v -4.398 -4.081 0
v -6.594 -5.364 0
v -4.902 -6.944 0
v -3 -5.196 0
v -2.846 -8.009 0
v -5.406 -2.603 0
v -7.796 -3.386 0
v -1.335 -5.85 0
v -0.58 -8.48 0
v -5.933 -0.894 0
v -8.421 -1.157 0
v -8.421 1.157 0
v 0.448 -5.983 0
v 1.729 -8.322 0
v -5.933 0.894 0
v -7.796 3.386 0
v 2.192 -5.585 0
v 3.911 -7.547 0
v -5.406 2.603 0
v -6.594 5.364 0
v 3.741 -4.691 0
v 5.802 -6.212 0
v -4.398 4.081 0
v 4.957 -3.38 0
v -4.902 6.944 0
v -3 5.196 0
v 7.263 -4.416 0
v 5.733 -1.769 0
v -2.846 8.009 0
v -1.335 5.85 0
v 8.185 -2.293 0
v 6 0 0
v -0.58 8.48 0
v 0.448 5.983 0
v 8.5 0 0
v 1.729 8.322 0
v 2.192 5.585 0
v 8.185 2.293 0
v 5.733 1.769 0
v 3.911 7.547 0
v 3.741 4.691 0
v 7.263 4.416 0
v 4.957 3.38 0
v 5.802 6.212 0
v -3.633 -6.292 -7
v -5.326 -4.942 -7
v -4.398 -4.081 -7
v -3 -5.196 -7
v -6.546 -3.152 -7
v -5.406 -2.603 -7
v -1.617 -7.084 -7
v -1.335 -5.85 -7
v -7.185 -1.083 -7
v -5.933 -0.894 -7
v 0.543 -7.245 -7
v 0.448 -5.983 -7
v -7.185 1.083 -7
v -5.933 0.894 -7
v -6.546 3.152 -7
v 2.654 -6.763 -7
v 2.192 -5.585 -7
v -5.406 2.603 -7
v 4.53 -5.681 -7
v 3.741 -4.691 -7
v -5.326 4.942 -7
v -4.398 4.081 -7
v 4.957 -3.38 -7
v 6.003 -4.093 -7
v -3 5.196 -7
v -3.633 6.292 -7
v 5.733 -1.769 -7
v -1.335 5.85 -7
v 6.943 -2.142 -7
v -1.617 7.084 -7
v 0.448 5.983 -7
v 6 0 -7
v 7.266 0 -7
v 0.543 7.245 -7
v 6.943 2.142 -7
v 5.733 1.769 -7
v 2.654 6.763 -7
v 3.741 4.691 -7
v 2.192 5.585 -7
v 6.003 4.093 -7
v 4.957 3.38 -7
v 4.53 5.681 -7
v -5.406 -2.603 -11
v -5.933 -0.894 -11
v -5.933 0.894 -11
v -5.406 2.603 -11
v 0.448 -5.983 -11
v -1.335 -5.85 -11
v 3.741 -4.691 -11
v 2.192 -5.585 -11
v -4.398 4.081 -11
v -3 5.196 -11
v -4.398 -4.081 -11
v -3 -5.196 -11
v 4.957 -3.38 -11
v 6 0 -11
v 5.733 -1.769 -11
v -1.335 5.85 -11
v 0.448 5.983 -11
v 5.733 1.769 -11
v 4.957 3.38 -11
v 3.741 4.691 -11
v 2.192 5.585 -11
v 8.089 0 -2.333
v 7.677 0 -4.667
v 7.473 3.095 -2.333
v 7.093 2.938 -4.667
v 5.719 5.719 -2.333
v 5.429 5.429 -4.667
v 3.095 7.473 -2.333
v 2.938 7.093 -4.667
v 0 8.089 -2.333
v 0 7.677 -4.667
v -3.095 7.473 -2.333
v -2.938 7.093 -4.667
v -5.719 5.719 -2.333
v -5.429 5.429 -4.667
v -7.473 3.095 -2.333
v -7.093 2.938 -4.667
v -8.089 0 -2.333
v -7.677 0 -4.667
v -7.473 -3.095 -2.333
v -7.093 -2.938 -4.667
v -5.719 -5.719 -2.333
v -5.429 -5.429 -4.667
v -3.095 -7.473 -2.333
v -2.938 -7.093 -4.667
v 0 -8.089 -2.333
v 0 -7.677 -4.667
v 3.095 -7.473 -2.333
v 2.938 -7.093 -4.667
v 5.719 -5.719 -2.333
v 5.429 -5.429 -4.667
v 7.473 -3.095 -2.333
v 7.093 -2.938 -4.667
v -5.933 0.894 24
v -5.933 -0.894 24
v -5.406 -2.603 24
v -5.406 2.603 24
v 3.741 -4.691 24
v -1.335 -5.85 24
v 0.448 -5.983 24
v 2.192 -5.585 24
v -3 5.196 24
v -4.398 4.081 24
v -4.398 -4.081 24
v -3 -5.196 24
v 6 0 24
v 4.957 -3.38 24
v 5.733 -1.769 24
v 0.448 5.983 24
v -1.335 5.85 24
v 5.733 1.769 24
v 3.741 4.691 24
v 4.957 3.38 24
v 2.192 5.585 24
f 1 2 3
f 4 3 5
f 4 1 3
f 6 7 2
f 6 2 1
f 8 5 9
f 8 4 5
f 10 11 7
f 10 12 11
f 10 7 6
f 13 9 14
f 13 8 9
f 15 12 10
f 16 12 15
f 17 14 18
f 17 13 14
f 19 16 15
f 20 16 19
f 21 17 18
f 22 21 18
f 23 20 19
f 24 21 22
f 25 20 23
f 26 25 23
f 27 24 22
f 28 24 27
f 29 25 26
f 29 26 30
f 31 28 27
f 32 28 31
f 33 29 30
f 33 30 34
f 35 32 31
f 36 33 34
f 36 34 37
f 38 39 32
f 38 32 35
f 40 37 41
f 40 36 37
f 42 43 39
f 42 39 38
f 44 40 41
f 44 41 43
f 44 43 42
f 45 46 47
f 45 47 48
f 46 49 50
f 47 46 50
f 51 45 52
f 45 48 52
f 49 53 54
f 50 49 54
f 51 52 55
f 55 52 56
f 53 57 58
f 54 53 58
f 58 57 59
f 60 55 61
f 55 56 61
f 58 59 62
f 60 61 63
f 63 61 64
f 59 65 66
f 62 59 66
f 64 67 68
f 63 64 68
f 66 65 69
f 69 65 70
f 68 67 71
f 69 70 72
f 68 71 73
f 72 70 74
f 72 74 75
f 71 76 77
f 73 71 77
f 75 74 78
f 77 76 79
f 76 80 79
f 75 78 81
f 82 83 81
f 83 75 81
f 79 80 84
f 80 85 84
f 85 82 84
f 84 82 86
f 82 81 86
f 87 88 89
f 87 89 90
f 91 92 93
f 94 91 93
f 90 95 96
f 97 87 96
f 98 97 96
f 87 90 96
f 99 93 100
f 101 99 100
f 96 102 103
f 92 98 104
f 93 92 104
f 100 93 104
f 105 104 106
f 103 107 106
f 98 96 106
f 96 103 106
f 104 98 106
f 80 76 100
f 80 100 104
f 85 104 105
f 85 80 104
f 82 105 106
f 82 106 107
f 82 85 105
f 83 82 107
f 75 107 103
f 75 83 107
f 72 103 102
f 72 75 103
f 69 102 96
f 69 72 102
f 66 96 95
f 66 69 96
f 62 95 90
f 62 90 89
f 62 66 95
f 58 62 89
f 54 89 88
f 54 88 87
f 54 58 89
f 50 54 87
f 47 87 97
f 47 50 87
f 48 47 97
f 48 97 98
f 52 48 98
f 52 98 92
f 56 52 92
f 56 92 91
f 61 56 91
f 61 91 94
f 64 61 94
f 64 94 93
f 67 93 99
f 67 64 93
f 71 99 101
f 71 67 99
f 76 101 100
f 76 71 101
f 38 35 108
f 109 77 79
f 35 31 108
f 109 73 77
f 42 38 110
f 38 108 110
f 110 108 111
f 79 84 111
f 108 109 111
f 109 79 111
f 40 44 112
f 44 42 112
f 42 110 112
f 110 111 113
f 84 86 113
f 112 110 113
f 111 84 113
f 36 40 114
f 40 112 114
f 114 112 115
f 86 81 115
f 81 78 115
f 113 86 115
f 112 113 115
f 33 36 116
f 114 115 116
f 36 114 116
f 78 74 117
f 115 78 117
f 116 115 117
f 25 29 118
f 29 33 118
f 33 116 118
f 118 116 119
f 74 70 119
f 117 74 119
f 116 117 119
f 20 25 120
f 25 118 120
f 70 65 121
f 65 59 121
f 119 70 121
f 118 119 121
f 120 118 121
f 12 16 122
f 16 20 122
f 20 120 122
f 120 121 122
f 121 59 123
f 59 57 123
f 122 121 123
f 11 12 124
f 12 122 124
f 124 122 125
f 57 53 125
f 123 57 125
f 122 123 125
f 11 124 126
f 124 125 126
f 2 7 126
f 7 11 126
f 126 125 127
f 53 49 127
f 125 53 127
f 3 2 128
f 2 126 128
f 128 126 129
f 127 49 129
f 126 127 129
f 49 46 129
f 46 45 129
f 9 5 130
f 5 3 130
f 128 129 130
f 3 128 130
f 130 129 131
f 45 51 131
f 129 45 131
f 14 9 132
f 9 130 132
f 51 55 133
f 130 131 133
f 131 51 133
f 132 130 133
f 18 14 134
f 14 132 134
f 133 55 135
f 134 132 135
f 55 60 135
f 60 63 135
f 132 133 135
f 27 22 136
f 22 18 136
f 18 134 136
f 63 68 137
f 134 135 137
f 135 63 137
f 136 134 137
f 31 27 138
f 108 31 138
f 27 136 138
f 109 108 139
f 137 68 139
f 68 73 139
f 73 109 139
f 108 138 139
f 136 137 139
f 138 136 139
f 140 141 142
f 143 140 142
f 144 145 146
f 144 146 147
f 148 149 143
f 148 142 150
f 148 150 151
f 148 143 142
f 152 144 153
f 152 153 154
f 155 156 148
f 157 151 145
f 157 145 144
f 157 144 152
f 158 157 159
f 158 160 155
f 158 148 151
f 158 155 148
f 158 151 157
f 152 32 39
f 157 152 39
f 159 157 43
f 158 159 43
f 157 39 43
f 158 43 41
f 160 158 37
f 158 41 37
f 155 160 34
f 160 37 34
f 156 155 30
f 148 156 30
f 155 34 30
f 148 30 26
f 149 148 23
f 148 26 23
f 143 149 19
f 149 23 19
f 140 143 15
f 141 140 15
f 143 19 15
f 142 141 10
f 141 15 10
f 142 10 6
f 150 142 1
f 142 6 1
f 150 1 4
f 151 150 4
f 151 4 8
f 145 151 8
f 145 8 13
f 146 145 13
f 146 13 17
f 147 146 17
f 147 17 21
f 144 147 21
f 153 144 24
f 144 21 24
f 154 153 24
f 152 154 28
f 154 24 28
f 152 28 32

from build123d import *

# Parameters (mm, degrees)
SKETCH1_R           = 6
BOSS_EXTRUDE1_DEPTH = 24
SKETCH2_R           = 8.5
BOSS_EXTRUDE2_DEPTH = 7
BOSS_EXTRUDE2_TAPER = 10
BOSS_EXTRUDE3_START = -7
SKETCH3_R           = 6
BOSS_EXTRUDE3_DEPTH = 4


with BuildPart() as part:
    # Sketch1 → Boss-Extrude1 (new body)
    with BuildSketch(Plane.XY):
        Circle(SKETCH1_R)
    extrude(amount=BOSS_EXTRUDE1_DEPTH)

    # Sketch2 → Boss-Extrude2 (add)
    with BuildSketch(Plane.XY):
        Circle(SKETCH2_R)
    extrude(amount=-BOSS_EXTRUDE2_DEPTH, taper=BOSS_EXTRUDE2_TAPER)

    # Sketch3 → Boss-Extrude3 (add)
    with BuildSketch(Plane.XY.offset(BOSS_EXTRUDE3_START)):
        Circle(SKETCH3_R)
    extrude(amount=-BOSS_EXTRUDE3_DEPTH)


solid = part.part
